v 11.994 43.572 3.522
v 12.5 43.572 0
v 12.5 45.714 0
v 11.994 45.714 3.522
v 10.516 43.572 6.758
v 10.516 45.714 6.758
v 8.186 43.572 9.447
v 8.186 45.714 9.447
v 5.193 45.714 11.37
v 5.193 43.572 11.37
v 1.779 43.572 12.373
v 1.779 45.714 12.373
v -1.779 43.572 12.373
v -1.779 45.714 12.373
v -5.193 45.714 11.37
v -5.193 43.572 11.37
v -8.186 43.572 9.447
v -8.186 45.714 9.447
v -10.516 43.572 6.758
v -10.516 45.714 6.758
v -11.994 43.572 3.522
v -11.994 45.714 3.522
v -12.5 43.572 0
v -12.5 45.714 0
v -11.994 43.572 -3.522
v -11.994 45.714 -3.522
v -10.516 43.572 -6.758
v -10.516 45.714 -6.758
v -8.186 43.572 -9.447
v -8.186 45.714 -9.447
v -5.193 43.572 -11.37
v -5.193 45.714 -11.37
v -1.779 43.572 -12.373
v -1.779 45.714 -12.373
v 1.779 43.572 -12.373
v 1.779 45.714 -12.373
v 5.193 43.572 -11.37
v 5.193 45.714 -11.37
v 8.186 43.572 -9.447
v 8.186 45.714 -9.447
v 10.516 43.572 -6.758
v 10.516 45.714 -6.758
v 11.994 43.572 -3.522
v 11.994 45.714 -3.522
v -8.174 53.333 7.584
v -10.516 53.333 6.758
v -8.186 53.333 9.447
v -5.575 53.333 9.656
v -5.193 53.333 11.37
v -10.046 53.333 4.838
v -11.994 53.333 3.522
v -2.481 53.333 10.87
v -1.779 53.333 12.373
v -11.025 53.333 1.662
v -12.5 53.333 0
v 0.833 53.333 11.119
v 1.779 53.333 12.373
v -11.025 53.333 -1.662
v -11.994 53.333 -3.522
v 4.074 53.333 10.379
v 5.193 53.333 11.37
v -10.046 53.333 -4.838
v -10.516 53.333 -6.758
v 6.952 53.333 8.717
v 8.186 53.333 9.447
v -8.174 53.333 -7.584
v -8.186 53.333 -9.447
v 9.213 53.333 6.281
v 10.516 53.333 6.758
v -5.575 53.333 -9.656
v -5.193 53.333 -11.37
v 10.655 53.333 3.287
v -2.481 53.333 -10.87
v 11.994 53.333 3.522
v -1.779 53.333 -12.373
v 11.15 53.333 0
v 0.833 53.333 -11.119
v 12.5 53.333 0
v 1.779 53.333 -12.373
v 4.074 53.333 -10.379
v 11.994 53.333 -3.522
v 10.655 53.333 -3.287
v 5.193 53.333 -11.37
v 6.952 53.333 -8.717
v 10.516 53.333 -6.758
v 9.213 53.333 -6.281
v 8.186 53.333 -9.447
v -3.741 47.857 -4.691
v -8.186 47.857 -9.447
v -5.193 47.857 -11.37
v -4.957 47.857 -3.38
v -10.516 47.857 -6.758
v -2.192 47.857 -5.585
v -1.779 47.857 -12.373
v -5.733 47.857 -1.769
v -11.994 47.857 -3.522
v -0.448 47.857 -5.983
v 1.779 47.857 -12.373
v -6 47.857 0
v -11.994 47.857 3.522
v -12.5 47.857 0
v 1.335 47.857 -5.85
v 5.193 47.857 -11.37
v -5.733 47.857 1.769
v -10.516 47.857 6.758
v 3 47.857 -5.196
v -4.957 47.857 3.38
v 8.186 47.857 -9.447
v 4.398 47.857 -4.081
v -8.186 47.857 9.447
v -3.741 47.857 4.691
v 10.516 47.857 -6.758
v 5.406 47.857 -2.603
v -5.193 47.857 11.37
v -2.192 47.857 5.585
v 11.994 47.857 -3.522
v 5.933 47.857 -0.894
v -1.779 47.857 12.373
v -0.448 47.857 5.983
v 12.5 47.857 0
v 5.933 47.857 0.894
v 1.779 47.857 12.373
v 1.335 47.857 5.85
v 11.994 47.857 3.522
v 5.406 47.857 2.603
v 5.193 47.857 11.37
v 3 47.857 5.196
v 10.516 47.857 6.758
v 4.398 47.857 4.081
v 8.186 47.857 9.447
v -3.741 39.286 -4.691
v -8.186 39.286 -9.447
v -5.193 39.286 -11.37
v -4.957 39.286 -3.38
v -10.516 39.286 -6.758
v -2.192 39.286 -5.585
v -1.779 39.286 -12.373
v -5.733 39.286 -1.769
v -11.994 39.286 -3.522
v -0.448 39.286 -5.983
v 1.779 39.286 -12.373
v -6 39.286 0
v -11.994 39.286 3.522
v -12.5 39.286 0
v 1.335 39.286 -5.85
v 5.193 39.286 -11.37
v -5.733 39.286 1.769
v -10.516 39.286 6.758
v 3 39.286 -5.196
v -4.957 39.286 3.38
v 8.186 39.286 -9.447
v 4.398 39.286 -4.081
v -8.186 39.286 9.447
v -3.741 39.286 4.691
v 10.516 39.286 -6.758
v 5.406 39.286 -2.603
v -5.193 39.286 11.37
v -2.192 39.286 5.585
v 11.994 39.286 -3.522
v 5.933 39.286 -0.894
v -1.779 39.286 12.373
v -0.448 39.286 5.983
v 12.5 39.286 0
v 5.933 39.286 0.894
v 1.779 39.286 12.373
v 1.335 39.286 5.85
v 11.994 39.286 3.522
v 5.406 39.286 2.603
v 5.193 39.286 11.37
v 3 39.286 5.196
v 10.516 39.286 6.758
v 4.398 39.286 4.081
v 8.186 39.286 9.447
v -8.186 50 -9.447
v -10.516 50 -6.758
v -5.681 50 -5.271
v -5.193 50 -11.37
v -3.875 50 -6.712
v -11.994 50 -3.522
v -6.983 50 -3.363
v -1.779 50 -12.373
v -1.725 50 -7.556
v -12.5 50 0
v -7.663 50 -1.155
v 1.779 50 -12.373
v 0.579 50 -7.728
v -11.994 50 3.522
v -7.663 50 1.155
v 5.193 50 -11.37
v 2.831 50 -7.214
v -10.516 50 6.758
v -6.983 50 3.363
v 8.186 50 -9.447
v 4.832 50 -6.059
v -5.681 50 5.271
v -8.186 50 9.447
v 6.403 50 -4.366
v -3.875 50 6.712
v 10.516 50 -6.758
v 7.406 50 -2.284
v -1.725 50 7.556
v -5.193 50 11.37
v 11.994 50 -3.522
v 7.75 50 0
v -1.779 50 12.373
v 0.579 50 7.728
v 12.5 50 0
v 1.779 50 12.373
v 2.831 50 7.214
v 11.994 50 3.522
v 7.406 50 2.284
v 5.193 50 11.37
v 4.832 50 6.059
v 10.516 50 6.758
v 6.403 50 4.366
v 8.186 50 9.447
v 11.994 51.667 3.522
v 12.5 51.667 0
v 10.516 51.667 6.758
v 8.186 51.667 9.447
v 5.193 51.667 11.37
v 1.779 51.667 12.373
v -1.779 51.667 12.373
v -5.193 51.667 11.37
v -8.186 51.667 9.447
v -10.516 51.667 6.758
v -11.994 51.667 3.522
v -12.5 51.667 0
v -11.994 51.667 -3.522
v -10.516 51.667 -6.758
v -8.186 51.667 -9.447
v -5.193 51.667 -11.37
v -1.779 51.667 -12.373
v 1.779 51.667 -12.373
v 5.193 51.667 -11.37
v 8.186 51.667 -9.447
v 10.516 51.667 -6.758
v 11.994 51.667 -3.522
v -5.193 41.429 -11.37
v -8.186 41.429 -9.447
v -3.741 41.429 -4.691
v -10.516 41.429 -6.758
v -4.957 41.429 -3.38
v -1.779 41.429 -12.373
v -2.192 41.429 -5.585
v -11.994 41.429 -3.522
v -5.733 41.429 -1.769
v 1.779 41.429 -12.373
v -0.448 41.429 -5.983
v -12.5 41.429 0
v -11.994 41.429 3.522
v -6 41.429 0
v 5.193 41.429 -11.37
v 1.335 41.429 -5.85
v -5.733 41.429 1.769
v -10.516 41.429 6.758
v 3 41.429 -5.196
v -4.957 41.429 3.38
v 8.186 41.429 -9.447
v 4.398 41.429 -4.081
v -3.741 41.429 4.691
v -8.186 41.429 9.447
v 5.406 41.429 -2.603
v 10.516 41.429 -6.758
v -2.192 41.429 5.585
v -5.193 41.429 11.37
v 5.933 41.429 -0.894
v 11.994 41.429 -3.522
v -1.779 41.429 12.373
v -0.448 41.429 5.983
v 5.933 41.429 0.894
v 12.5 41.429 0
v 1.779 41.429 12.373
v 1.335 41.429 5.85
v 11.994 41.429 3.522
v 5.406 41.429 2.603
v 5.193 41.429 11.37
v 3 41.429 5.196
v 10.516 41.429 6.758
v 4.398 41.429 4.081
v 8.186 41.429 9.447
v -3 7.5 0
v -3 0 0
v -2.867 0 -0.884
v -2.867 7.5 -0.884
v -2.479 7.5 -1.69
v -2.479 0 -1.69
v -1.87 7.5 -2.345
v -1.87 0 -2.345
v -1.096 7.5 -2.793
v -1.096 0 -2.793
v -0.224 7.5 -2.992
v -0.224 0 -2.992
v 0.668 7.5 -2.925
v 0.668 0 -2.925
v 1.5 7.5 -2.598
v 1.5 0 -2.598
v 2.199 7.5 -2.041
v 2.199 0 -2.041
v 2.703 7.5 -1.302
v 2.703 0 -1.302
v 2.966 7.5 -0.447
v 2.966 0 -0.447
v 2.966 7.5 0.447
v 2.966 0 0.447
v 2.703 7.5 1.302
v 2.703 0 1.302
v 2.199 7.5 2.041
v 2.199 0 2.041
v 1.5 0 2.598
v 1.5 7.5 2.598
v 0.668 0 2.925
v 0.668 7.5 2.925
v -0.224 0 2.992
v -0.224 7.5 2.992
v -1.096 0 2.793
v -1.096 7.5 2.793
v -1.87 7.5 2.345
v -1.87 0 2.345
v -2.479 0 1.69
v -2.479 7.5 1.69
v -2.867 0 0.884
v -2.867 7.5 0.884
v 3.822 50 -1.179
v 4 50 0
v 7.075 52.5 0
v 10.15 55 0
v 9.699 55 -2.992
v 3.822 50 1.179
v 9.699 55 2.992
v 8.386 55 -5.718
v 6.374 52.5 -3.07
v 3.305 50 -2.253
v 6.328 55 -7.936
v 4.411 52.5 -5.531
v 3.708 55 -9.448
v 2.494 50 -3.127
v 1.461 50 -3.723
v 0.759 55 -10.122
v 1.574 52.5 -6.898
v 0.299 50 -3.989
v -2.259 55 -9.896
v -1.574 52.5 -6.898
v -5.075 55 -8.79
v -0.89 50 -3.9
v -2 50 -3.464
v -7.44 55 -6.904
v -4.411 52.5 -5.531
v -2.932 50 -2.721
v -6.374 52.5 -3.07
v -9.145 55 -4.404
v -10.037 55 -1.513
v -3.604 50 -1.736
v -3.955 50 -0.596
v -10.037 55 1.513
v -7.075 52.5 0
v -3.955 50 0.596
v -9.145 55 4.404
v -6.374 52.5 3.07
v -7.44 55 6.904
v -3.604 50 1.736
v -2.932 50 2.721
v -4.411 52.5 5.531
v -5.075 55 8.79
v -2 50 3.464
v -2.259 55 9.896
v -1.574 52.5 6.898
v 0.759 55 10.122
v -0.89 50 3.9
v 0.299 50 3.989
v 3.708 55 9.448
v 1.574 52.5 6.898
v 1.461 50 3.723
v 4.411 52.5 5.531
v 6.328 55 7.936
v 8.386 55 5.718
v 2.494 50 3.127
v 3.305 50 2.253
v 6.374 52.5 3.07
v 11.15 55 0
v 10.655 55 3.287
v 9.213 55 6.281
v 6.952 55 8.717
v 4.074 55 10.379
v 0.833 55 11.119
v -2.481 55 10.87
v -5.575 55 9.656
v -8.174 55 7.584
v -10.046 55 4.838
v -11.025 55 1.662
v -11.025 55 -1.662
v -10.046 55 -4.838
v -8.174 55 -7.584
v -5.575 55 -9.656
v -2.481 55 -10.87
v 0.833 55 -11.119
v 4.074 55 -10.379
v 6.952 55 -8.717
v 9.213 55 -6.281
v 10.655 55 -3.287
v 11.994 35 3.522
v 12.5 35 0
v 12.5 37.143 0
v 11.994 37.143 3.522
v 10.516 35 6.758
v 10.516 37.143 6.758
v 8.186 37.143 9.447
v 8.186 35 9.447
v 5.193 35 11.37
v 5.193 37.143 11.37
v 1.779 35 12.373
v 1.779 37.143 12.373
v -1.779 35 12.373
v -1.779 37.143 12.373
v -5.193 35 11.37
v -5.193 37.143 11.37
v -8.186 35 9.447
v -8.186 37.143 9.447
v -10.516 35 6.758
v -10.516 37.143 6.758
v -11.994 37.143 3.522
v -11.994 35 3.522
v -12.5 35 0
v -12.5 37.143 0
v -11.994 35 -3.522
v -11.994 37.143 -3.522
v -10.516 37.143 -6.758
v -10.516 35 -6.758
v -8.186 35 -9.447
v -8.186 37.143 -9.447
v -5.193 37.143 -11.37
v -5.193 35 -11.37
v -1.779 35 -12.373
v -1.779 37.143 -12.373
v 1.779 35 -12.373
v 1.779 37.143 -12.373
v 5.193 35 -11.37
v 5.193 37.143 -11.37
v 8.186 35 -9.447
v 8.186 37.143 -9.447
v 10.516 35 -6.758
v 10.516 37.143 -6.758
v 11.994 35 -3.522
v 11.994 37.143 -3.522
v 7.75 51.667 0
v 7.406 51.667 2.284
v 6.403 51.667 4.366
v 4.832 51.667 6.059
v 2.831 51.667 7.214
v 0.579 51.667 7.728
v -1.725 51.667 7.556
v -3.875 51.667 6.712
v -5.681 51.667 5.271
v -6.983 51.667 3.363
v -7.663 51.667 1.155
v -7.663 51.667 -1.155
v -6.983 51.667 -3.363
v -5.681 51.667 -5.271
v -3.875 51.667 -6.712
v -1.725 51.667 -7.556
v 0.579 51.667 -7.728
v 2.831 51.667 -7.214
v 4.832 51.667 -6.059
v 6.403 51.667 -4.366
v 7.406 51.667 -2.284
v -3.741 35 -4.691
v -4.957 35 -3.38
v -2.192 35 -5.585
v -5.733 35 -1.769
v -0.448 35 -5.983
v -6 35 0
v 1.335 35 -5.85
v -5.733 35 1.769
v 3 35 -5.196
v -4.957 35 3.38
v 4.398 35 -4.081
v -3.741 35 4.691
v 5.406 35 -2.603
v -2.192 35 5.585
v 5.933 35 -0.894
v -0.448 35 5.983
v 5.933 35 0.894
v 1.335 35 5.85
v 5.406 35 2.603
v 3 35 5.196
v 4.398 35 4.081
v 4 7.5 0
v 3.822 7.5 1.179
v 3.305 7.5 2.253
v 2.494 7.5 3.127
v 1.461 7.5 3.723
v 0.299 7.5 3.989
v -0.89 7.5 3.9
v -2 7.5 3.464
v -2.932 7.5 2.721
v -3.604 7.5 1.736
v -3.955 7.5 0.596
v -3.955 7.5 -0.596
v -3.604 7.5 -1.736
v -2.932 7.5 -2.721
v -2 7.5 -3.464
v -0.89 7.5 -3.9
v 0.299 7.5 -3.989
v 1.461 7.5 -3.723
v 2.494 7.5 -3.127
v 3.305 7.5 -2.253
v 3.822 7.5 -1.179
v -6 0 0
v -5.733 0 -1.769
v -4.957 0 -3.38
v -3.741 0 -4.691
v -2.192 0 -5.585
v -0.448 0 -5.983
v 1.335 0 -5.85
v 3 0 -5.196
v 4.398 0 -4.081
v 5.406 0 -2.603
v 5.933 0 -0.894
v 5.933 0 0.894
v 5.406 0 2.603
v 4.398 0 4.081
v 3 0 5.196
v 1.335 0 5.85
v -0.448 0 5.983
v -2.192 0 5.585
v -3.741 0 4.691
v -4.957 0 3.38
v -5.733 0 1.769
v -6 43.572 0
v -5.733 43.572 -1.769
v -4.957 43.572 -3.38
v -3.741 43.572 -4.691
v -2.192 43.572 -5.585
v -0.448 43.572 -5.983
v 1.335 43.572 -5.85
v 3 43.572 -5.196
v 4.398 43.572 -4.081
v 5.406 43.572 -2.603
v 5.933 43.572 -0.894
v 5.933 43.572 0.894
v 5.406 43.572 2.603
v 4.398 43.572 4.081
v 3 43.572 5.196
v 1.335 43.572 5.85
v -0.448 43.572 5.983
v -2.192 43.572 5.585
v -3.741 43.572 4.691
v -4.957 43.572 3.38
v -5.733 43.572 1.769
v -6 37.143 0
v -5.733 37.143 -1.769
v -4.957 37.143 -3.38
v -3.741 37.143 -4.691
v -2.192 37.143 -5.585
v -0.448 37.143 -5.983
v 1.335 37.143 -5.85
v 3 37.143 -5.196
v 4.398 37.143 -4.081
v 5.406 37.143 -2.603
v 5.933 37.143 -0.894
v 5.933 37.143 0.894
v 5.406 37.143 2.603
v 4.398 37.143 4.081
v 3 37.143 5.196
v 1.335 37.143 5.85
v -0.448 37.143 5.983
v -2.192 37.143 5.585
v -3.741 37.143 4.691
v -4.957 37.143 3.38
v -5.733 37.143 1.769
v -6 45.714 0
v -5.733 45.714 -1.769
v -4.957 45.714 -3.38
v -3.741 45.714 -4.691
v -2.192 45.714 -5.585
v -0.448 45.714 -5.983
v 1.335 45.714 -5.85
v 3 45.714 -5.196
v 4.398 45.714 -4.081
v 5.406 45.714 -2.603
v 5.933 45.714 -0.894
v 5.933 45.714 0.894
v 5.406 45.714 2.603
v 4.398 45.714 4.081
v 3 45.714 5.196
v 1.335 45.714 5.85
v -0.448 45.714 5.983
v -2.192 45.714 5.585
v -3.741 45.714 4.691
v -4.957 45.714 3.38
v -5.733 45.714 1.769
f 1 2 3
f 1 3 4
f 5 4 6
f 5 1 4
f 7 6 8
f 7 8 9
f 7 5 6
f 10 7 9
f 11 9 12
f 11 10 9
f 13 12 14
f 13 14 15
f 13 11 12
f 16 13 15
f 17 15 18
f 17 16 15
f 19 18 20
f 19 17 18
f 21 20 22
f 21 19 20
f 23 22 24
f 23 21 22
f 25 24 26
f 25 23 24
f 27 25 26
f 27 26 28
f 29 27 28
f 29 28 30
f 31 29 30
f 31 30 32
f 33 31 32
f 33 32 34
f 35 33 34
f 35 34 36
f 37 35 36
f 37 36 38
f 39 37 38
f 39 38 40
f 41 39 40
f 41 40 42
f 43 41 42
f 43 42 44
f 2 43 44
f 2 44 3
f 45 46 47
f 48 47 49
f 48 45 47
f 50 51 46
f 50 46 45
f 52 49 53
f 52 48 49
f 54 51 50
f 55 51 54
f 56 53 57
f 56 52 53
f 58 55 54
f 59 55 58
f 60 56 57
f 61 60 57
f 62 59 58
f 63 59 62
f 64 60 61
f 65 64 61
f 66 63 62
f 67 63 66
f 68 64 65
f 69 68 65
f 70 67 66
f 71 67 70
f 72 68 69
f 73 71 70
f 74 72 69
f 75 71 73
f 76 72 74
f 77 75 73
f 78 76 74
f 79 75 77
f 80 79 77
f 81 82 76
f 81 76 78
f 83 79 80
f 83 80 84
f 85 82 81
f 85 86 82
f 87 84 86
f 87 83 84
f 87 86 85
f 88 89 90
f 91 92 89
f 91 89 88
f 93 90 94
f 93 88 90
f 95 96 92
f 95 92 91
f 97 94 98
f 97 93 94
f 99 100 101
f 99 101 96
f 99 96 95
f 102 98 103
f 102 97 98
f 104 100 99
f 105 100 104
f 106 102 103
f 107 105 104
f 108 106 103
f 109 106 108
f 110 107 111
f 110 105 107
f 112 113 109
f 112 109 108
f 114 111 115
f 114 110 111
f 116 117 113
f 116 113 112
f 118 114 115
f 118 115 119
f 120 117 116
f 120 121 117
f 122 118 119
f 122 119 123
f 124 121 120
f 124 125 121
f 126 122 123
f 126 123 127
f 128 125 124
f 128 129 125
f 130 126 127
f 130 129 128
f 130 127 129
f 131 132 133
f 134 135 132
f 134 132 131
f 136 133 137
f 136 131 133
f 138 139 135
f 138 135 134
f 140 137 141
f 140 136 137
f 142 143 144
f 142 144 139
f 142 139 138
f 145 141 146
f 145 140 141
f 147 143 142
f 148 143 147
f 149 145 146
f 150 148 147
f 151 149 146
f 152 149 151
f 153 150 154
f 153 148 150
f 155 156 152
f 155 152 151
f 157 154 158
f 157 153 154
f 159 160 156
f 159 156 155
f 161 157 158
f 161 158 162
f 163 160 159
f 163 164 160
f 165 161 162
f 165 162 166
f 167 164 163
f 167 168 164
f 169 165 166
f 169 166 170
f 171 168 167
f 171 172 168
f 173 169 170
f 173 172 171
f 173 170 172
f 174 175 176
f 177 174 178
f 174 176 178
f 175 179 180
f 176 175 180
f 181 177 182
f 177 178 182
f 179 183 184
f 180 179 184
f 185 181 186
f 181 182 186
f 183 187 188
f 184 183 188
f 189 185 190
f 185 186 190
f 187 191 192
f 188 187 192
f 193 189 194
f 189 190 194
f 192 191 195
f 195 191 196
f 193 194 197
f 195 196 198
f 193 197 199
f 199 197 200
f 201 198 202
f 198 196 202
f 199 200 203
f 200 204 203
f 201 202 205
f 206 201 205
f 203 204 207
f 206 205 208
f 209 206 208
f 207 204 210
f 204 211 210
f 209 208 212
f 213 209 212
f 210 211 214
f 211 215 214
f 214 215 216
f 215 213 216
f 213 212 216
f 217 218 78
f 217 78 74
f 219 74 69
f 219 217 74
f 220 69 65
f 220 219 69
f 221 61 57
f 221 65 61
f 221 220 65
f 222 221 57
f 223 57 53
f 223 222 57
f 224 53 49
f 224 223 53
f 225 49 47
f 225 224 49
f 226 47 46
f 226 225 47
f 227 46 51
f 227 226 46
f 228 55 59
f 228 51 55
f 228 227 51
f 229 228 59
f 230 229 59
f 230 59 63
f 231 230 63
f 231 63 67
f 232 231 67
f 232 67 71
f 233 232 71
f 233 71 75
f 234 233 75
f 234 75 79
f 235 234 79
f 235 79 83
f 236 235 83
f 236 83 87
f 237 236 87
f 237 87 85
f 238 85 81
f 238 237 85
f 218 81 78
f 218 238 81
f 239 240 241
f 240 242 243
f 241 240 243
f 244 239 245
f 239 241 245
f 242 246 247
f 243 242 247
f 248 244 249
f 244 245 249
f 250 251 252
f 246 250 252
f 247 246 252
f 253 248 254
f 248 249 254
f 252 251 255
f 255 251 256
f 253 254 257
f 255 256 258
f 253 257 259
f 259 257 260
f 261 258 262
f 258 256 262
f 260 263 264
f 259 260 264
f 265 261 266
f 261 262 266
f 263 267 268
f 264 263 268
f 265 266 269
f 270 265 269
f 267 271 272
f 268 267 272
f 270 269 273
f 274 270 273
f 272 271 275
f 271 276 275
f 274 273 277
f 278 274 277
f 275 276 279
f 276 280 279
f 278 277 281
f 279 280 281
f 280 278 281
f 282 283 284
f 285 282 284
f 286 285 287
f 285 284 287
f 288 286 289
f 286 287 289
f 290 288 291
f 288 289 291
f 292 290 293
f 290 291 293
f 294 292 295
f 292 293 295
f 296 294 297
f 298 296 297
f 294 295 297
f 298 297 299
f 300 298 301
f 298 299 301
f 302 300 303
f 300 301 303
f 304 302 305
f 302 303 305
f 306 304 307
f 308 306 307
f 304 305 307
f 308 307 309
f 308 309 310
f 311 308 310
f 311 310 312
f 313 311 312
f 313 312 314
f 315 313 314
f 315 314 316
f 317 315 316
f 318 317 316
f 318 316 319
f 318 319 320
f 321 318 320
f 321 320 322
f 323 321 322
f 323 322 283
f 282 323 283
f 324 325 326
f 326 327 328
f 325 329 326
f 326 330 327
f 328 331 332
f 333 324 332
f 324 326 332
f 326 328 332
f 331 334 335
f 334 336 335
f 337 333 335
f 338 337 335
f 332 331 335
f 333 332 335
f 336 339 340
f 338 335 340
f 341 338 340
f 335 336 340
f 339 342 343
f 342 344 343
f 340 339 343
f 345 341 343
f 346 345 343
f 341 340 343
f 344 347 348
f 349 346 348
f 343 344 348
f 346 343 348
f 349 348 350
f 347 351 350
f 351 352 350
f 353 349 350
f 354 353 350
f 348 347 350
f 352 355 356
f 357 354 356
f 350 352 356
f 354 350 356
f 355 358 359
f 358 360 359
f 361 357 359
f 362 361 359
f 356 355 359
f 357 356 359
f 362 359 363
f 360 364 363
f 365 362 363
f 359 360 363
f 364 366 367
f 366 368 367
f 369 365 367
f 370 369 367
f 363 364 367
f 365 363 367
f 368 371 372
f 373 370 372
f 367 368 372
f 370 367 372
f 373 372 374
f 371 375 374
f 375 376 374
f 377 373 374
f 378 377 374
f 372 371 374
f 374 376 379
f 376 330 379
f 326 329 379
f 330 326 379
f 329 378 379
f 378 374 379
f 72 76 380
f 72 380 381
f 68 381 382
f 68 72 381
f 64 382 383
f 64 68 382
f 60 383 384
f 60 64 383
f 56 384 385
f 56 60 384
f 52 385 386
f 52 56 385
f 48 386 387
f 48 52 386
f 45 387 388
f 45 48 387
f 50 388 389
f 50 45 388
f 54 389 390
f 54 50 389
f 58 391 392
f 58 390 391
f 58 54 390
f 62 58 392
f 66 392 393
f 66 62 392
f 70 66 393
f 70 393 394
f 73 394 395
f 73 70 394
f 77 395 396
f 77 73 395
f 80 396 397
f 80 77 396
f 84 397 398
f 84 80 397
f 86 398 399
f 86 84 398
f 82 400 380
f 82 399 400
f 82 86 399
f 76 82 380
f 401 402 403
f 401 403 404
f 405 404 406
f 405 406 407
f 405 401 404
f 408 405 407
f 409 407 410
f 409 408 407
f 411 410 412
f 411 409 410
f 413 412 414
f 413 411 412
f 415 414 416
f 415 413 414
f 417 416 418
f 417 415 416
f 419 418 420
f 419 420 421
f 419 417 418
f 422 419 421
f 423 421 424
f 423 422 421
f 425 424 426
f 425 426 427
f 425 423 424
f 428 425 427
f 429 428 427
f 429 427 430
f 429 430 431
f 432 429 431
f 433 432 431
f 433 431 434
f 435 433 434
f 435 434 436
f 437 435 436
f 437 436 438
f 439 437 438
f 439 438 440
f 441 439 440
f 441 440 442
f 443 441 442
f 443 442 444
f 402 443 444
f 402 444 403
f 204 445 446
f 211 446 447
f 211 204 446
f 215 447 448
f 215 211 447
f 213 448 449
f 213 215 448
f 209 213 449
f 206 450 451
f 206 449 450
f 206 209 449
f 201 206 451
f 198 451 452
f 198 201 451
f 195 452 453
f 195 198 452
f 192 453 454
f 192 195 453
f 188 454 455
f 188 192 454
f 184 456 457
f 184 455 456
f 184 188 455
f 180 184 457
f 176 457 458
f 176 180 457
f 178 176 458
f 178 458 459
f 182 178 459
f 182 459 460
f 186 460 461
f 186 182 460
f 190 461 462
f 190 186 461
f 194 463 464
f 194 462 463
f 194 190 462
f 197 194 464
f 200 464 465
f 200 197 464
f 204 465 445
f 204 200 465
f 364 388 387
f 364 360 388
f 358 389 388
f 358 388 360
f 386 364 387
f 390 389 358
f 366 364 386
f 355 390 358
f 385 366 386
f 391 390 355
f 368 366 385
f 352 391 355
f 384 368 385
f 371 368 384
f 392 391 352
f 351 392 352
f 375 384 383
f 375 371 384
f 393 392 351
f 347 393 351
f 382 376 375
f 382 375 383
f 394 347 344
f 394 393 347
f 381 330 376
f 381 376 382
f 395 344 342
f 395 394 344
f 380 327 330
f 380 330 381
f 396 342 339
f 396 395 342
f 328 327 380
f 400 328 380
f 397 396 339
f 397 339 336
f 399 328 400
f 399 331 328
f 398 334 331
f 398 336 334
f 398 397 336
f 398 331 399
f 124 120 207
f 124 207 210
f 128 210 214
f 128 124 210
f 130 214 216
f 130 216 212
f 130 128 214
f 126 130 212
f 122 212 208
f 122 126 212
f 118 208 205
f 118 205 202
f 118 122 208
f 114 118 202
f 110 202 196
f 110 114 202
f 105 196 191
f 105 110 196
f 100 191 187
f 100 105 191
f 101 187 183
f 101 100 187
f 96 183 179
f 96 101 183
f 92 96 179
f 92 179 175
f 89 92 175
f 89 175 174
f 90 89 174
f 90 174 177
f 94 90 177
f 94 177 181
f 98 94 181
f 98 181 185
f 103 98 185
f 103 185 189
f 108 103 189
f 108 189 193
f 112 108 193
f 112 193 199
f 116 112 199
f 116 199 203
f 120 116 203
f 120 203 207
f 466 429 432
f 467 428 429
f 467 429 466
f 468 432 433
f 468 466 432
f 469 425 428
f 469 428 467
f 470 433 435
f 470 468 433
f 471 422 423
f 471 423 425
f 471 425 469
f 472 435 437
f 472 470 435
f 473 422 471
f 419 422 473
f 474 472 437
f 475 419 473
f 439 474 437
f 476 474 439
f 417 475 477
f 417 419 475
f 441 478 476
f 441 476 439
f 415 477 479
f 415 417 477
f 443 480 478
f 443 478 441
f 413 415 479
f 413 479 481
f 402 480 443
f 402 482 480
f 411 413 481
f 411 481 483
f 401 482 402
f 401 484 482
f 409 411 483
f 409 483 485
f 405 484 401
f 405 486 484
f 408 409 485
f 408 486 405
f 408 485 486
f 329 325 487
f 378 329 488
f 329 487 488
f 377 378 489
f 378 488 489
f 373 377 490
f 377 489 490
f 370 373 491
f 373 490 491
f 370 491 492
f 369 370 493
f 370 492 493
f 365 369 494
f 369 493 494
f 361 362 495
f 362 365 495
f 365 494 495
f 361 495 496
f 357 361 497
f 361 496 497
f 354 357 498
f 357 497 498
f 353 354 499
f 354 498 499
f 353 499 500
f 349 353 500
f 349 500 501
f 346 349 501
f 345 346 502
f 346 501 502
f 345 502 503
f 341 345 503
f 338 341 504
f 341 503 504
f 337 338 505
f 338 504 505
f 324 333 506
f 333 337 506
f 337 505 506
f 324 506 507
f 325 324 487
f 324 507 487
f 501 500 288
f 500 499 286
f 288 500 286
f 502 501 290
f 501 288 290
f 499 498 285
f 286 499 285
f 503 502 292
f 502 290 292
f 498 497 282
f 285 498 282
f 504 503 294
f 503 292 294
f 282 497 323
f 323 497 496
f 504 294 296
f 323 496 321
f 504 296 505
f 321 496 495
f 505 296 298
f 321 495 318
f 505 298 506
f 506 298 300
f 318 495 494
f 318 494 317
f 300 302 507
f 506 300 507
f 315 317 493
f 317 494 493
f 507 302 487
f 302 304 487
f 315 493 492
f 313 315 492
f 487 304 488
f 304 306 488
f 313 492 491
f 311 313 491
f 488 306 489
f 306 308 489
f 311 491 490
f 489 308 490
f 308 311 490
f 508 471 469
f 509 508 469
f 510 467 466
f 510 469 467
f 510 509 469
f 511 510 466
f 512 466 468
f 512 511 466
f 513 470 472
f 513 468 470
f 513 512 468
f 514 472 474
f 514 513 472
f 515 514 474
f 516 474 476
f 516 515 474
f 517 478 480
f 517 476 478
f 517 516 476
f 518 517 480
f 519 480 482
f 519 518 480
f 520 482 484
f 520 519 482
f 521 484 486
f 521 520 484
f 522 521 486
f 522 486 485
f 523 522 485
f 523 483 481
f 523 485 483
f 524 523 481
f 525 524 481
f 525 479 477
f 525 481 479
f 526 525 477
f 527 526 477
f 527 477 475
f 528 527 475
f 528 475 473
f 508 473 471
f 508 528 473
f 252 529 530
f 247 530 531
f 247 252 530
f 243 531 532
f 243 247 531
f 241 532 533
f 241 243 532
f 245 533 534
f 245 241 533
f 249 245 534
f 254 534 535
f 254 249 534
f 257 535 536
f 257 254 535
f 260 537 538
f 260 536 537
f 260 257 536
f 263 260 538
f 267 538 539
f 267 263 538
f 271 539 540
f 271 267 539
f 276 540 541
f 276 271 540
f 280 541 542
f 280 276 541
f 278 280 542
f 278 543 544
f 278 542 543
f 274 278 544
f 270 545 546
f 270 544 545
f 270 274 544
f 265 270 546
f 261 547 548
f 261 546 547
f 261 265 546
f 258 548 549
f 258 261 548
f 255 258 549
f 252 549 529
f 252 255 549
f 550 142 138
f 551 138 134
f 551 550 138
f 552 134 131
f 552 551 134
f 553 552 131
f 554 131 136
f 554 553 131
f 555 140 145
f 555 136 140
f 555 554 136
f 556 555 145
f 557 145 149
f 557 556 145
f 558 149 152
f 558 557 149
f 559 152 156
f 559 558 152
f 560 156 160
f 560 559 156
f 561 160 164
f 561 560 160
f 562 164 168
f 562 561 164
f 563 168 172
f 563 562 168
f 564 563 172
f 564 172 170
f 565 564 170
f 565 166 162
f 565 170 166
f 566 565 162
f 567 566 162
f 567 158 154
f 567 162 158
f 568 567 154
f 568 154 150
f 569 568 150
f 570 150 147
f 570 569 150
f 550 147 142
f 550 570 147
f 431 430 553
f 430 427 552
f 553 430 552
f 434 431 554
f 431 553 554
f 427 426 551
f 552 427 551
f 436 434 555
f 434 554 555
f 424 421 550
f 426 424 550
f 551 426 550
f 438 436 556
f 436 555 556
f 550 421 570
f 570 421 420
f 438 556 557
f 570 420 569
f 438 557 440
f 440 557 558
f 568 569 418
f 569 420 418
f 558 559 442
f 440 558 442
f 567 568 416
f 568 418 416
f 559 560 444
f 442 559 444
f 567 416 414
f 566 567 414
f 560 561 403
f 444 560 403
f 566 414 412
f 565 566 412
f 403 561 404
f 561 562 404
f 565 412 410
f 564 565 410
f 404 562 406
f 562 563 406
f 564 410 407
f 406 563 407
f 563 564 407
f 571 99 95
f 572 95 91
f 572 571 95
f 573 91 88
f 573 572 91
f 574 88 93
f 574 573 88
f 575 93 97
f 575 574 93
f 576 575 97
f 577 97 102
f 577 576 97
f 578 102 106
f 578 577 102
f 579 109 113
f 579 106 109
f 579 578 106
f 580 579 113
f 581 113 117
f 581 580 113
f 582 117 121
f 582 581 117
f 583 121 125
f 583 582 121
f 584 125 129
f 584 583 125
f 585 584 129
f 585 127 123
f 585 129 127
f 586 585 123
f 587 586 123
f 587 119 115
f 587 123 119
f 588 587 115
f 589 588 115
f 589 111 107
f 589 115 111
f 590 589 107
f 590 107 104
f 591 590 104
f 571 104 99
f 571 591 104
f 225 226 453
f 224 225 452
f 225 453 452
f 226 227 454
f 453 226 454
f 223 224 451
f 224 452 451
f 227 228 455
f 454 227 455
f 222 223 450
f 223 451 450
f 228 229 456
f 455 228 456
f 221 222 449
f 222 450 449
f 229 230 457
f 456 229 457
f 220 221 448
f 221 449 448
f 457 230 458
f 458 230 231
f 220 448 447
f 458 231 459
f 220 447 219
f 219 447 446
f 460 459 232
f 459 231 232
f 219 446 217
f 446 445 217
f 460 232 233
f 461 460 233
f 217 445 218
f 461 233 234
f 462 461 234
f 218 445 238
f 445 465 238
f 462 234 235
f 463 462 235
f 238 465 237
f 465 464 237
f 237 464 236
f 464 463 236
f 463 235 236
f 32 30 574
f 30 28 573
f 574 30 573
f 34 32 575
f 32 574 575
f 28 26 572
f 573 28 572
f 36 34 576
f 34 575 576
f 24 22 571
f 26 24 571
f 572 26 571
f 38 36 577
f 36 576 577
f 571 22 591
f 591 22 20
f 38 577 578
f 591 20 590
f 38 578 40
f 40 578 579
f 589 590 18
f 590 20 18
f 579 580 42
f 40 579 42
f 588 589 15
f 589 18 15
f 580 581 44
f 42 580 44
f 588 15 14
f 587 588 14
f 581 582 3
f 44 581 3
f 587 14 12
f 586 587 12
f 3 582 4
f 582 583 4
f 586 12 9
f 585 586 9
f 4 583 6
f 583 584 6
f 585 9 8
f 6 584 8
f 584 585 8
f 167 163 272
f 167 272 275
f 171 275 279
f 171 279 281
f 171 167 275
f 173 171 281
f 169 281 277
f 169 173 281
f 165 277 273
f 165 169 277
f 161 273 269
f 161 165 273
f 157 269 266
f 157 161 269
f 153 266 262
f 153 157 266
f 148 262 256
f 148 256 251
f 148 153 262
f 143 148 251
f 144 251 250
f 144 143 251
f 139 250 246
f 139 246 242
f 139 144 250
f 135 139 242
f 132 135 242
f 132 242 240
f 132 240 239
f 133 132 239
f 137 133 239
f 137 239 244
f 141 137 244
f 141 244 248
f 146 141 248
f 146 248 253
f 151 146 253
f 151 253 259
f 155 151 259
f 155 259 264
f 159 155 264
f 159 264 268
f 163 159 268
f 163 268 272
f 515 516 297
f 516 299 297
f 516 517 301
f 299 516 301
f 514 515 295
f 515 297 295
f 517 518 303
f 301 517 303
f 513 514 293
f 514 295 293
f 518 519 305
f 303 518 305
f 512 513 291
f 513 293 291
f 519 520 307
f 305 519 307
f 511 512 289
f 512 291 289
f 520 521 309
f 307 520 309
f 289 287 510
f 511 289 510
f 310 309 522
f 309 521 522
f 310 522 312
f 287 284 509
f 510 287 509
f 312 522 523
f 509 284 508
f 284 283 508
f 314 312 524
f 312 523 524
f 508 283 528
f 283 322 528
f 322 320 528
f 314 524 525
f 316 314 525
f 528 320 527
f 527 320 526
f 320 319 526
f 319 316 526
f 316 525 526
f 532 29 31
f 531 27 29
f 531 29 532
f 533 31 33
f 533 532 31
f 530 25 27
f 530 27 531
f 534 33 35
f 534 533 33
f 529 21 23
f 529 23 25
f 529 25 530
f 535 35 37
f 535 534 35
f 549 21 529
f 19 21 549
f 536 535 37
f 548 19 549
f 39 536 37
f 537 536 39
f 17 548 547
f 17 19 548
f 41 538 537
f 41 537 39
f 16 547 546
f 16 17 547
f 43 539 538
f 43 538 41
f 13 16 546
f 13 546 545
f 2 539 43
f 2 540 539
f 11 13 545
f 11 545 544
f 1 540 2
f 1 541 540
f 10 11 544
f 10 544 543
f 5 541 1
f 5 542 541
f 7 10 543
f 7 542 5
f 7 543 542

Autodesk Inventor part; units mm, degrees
sketch "Boceto1" plane through (0, 0, 0) normal (0, 1, 0) x (-1, 0, 0)
  circle A0 centre (0, 0) radius 6
  circle A1 centre (0, 0) radius 3
  dimension "d0" = 12
  dimension "d1" = 6
extrude "Extrusión1" add sketch "Boceto1" along normal blind 50
ref_plane "Plano de trabajo3" through (0, 7.5, 0) normal (0, 1, 0) x (1, 0, 0)
sketch "Boceto20" plane through (0, 50, 0) normal (0, 1, 0) x (1, 0, 0)
  circle A0 centre (0, 0) radius 7.75
  circle A1 centre (0, 0) radius 3.9641
  circle A2 centre (0, 0) radius 4
  dimension "d50" = 15.5
  dimension "d72" = 8
extrude "Extrusión14" add sketch "Boceto20" along normal blind 1.6666 contours A0
sketch "Boceto21" plane through (0, 51.6666, 0) normal (0, 1, 0) x (1, 0, 0)
  circle A0 centre (0, 0) radius 12.5
  circle A1 centre (0, 0) radius 4
  dimension "d53" = 25
extrude "Extrusión15" add sketch "Boceto21" along normal blind 1.6666
sketch "Boceto22" plane through (0, 53.3332, 0) normal (0, 1, 0) x (1, 0, 0)
  circle A0 centre (0, 0) radius 11.15
  circle A1 centre (0, 0) radius 3.9641
  dimension "d56" = 22.3
extrude "Extrusión16" add sketch "Boceto22" along normal blind 1.6666
ref_plane "Plano de trabajo17" through (0, 43.5716, 0) normal (0, -1, 0) x (1, 0, 0)
ref_plane "Plano de trabajo16" through (0, 41.4287, 0) normal (0, -1, 0) x (1, 0, 0)
sketch "Boceto23" plane through (0, 35, 0) normal (0, -1, 0) x (1, 0, 0)
  circle A0 centre (0, 0) radius 12.5
  circle A1 centre (0, 0) radius 6
  dimension "d64" = 25
  dimension "d65" = 12
extrude "Extrusión17" add sketch "Boceto23" against normal blind 2.1429
pattern_linear "Patrón rectangular1" count 4 spacing 4.2858 along (0, 1, 0) of "Extrusión17"
sketch "Boceto24" plane through (0, 54.9998, 0) normal (0, 1, 0) x (1, 0, 0)
  circle A0 centre (0, 0) radius 10.15
  dimension "d71" = 20.3
ref_plane "Plano de trabajo18" through (0, 49.9998, 0) normal (0, 1, 0) x (1, 0, 0)
sketch "Boceto25" plane through (0, 49.9998, 0) normal (0, 1, 0) x (1, 0, 0)
  circle A0 centre (0, 0) radius 4
  dimension "d74" = 8
loft "Solevación2" cut profiles "Boceto24", "Boceto25"
ref_plane "Plano de trabajo19" through (0, 7.5, 0) normal (0, -1, 0) x (1, 0, 0)
sketch "Boceto26" plane through (0, 7.5, 0) normal (0, -1, 0) x (1, 0, 0)
  circle A0 centre (0, 0) radius 6 projected
  circle A1 centre (0, 0) radius 4
  dimension "d80" = 8
extrude "Extrusión18" cut sketch "Boceto26" against normal blind 47.5 contours A1
ref_plane "Plano de trabajo13" through (0, 35, 0) normal (0, -1, 0) x (1, 0, 0)
ref_plane "Plano de trabajo14" through (0, 37.1429, 0) normal (0, -1, 0) x (1, 0, 0)
ref_plane "Plano de trabajo15" through (0, 39.2858, 0) normal (0, -1, 0) x (1, 0, 0)
properties part number "Barrel husillo 8mm_V2"
